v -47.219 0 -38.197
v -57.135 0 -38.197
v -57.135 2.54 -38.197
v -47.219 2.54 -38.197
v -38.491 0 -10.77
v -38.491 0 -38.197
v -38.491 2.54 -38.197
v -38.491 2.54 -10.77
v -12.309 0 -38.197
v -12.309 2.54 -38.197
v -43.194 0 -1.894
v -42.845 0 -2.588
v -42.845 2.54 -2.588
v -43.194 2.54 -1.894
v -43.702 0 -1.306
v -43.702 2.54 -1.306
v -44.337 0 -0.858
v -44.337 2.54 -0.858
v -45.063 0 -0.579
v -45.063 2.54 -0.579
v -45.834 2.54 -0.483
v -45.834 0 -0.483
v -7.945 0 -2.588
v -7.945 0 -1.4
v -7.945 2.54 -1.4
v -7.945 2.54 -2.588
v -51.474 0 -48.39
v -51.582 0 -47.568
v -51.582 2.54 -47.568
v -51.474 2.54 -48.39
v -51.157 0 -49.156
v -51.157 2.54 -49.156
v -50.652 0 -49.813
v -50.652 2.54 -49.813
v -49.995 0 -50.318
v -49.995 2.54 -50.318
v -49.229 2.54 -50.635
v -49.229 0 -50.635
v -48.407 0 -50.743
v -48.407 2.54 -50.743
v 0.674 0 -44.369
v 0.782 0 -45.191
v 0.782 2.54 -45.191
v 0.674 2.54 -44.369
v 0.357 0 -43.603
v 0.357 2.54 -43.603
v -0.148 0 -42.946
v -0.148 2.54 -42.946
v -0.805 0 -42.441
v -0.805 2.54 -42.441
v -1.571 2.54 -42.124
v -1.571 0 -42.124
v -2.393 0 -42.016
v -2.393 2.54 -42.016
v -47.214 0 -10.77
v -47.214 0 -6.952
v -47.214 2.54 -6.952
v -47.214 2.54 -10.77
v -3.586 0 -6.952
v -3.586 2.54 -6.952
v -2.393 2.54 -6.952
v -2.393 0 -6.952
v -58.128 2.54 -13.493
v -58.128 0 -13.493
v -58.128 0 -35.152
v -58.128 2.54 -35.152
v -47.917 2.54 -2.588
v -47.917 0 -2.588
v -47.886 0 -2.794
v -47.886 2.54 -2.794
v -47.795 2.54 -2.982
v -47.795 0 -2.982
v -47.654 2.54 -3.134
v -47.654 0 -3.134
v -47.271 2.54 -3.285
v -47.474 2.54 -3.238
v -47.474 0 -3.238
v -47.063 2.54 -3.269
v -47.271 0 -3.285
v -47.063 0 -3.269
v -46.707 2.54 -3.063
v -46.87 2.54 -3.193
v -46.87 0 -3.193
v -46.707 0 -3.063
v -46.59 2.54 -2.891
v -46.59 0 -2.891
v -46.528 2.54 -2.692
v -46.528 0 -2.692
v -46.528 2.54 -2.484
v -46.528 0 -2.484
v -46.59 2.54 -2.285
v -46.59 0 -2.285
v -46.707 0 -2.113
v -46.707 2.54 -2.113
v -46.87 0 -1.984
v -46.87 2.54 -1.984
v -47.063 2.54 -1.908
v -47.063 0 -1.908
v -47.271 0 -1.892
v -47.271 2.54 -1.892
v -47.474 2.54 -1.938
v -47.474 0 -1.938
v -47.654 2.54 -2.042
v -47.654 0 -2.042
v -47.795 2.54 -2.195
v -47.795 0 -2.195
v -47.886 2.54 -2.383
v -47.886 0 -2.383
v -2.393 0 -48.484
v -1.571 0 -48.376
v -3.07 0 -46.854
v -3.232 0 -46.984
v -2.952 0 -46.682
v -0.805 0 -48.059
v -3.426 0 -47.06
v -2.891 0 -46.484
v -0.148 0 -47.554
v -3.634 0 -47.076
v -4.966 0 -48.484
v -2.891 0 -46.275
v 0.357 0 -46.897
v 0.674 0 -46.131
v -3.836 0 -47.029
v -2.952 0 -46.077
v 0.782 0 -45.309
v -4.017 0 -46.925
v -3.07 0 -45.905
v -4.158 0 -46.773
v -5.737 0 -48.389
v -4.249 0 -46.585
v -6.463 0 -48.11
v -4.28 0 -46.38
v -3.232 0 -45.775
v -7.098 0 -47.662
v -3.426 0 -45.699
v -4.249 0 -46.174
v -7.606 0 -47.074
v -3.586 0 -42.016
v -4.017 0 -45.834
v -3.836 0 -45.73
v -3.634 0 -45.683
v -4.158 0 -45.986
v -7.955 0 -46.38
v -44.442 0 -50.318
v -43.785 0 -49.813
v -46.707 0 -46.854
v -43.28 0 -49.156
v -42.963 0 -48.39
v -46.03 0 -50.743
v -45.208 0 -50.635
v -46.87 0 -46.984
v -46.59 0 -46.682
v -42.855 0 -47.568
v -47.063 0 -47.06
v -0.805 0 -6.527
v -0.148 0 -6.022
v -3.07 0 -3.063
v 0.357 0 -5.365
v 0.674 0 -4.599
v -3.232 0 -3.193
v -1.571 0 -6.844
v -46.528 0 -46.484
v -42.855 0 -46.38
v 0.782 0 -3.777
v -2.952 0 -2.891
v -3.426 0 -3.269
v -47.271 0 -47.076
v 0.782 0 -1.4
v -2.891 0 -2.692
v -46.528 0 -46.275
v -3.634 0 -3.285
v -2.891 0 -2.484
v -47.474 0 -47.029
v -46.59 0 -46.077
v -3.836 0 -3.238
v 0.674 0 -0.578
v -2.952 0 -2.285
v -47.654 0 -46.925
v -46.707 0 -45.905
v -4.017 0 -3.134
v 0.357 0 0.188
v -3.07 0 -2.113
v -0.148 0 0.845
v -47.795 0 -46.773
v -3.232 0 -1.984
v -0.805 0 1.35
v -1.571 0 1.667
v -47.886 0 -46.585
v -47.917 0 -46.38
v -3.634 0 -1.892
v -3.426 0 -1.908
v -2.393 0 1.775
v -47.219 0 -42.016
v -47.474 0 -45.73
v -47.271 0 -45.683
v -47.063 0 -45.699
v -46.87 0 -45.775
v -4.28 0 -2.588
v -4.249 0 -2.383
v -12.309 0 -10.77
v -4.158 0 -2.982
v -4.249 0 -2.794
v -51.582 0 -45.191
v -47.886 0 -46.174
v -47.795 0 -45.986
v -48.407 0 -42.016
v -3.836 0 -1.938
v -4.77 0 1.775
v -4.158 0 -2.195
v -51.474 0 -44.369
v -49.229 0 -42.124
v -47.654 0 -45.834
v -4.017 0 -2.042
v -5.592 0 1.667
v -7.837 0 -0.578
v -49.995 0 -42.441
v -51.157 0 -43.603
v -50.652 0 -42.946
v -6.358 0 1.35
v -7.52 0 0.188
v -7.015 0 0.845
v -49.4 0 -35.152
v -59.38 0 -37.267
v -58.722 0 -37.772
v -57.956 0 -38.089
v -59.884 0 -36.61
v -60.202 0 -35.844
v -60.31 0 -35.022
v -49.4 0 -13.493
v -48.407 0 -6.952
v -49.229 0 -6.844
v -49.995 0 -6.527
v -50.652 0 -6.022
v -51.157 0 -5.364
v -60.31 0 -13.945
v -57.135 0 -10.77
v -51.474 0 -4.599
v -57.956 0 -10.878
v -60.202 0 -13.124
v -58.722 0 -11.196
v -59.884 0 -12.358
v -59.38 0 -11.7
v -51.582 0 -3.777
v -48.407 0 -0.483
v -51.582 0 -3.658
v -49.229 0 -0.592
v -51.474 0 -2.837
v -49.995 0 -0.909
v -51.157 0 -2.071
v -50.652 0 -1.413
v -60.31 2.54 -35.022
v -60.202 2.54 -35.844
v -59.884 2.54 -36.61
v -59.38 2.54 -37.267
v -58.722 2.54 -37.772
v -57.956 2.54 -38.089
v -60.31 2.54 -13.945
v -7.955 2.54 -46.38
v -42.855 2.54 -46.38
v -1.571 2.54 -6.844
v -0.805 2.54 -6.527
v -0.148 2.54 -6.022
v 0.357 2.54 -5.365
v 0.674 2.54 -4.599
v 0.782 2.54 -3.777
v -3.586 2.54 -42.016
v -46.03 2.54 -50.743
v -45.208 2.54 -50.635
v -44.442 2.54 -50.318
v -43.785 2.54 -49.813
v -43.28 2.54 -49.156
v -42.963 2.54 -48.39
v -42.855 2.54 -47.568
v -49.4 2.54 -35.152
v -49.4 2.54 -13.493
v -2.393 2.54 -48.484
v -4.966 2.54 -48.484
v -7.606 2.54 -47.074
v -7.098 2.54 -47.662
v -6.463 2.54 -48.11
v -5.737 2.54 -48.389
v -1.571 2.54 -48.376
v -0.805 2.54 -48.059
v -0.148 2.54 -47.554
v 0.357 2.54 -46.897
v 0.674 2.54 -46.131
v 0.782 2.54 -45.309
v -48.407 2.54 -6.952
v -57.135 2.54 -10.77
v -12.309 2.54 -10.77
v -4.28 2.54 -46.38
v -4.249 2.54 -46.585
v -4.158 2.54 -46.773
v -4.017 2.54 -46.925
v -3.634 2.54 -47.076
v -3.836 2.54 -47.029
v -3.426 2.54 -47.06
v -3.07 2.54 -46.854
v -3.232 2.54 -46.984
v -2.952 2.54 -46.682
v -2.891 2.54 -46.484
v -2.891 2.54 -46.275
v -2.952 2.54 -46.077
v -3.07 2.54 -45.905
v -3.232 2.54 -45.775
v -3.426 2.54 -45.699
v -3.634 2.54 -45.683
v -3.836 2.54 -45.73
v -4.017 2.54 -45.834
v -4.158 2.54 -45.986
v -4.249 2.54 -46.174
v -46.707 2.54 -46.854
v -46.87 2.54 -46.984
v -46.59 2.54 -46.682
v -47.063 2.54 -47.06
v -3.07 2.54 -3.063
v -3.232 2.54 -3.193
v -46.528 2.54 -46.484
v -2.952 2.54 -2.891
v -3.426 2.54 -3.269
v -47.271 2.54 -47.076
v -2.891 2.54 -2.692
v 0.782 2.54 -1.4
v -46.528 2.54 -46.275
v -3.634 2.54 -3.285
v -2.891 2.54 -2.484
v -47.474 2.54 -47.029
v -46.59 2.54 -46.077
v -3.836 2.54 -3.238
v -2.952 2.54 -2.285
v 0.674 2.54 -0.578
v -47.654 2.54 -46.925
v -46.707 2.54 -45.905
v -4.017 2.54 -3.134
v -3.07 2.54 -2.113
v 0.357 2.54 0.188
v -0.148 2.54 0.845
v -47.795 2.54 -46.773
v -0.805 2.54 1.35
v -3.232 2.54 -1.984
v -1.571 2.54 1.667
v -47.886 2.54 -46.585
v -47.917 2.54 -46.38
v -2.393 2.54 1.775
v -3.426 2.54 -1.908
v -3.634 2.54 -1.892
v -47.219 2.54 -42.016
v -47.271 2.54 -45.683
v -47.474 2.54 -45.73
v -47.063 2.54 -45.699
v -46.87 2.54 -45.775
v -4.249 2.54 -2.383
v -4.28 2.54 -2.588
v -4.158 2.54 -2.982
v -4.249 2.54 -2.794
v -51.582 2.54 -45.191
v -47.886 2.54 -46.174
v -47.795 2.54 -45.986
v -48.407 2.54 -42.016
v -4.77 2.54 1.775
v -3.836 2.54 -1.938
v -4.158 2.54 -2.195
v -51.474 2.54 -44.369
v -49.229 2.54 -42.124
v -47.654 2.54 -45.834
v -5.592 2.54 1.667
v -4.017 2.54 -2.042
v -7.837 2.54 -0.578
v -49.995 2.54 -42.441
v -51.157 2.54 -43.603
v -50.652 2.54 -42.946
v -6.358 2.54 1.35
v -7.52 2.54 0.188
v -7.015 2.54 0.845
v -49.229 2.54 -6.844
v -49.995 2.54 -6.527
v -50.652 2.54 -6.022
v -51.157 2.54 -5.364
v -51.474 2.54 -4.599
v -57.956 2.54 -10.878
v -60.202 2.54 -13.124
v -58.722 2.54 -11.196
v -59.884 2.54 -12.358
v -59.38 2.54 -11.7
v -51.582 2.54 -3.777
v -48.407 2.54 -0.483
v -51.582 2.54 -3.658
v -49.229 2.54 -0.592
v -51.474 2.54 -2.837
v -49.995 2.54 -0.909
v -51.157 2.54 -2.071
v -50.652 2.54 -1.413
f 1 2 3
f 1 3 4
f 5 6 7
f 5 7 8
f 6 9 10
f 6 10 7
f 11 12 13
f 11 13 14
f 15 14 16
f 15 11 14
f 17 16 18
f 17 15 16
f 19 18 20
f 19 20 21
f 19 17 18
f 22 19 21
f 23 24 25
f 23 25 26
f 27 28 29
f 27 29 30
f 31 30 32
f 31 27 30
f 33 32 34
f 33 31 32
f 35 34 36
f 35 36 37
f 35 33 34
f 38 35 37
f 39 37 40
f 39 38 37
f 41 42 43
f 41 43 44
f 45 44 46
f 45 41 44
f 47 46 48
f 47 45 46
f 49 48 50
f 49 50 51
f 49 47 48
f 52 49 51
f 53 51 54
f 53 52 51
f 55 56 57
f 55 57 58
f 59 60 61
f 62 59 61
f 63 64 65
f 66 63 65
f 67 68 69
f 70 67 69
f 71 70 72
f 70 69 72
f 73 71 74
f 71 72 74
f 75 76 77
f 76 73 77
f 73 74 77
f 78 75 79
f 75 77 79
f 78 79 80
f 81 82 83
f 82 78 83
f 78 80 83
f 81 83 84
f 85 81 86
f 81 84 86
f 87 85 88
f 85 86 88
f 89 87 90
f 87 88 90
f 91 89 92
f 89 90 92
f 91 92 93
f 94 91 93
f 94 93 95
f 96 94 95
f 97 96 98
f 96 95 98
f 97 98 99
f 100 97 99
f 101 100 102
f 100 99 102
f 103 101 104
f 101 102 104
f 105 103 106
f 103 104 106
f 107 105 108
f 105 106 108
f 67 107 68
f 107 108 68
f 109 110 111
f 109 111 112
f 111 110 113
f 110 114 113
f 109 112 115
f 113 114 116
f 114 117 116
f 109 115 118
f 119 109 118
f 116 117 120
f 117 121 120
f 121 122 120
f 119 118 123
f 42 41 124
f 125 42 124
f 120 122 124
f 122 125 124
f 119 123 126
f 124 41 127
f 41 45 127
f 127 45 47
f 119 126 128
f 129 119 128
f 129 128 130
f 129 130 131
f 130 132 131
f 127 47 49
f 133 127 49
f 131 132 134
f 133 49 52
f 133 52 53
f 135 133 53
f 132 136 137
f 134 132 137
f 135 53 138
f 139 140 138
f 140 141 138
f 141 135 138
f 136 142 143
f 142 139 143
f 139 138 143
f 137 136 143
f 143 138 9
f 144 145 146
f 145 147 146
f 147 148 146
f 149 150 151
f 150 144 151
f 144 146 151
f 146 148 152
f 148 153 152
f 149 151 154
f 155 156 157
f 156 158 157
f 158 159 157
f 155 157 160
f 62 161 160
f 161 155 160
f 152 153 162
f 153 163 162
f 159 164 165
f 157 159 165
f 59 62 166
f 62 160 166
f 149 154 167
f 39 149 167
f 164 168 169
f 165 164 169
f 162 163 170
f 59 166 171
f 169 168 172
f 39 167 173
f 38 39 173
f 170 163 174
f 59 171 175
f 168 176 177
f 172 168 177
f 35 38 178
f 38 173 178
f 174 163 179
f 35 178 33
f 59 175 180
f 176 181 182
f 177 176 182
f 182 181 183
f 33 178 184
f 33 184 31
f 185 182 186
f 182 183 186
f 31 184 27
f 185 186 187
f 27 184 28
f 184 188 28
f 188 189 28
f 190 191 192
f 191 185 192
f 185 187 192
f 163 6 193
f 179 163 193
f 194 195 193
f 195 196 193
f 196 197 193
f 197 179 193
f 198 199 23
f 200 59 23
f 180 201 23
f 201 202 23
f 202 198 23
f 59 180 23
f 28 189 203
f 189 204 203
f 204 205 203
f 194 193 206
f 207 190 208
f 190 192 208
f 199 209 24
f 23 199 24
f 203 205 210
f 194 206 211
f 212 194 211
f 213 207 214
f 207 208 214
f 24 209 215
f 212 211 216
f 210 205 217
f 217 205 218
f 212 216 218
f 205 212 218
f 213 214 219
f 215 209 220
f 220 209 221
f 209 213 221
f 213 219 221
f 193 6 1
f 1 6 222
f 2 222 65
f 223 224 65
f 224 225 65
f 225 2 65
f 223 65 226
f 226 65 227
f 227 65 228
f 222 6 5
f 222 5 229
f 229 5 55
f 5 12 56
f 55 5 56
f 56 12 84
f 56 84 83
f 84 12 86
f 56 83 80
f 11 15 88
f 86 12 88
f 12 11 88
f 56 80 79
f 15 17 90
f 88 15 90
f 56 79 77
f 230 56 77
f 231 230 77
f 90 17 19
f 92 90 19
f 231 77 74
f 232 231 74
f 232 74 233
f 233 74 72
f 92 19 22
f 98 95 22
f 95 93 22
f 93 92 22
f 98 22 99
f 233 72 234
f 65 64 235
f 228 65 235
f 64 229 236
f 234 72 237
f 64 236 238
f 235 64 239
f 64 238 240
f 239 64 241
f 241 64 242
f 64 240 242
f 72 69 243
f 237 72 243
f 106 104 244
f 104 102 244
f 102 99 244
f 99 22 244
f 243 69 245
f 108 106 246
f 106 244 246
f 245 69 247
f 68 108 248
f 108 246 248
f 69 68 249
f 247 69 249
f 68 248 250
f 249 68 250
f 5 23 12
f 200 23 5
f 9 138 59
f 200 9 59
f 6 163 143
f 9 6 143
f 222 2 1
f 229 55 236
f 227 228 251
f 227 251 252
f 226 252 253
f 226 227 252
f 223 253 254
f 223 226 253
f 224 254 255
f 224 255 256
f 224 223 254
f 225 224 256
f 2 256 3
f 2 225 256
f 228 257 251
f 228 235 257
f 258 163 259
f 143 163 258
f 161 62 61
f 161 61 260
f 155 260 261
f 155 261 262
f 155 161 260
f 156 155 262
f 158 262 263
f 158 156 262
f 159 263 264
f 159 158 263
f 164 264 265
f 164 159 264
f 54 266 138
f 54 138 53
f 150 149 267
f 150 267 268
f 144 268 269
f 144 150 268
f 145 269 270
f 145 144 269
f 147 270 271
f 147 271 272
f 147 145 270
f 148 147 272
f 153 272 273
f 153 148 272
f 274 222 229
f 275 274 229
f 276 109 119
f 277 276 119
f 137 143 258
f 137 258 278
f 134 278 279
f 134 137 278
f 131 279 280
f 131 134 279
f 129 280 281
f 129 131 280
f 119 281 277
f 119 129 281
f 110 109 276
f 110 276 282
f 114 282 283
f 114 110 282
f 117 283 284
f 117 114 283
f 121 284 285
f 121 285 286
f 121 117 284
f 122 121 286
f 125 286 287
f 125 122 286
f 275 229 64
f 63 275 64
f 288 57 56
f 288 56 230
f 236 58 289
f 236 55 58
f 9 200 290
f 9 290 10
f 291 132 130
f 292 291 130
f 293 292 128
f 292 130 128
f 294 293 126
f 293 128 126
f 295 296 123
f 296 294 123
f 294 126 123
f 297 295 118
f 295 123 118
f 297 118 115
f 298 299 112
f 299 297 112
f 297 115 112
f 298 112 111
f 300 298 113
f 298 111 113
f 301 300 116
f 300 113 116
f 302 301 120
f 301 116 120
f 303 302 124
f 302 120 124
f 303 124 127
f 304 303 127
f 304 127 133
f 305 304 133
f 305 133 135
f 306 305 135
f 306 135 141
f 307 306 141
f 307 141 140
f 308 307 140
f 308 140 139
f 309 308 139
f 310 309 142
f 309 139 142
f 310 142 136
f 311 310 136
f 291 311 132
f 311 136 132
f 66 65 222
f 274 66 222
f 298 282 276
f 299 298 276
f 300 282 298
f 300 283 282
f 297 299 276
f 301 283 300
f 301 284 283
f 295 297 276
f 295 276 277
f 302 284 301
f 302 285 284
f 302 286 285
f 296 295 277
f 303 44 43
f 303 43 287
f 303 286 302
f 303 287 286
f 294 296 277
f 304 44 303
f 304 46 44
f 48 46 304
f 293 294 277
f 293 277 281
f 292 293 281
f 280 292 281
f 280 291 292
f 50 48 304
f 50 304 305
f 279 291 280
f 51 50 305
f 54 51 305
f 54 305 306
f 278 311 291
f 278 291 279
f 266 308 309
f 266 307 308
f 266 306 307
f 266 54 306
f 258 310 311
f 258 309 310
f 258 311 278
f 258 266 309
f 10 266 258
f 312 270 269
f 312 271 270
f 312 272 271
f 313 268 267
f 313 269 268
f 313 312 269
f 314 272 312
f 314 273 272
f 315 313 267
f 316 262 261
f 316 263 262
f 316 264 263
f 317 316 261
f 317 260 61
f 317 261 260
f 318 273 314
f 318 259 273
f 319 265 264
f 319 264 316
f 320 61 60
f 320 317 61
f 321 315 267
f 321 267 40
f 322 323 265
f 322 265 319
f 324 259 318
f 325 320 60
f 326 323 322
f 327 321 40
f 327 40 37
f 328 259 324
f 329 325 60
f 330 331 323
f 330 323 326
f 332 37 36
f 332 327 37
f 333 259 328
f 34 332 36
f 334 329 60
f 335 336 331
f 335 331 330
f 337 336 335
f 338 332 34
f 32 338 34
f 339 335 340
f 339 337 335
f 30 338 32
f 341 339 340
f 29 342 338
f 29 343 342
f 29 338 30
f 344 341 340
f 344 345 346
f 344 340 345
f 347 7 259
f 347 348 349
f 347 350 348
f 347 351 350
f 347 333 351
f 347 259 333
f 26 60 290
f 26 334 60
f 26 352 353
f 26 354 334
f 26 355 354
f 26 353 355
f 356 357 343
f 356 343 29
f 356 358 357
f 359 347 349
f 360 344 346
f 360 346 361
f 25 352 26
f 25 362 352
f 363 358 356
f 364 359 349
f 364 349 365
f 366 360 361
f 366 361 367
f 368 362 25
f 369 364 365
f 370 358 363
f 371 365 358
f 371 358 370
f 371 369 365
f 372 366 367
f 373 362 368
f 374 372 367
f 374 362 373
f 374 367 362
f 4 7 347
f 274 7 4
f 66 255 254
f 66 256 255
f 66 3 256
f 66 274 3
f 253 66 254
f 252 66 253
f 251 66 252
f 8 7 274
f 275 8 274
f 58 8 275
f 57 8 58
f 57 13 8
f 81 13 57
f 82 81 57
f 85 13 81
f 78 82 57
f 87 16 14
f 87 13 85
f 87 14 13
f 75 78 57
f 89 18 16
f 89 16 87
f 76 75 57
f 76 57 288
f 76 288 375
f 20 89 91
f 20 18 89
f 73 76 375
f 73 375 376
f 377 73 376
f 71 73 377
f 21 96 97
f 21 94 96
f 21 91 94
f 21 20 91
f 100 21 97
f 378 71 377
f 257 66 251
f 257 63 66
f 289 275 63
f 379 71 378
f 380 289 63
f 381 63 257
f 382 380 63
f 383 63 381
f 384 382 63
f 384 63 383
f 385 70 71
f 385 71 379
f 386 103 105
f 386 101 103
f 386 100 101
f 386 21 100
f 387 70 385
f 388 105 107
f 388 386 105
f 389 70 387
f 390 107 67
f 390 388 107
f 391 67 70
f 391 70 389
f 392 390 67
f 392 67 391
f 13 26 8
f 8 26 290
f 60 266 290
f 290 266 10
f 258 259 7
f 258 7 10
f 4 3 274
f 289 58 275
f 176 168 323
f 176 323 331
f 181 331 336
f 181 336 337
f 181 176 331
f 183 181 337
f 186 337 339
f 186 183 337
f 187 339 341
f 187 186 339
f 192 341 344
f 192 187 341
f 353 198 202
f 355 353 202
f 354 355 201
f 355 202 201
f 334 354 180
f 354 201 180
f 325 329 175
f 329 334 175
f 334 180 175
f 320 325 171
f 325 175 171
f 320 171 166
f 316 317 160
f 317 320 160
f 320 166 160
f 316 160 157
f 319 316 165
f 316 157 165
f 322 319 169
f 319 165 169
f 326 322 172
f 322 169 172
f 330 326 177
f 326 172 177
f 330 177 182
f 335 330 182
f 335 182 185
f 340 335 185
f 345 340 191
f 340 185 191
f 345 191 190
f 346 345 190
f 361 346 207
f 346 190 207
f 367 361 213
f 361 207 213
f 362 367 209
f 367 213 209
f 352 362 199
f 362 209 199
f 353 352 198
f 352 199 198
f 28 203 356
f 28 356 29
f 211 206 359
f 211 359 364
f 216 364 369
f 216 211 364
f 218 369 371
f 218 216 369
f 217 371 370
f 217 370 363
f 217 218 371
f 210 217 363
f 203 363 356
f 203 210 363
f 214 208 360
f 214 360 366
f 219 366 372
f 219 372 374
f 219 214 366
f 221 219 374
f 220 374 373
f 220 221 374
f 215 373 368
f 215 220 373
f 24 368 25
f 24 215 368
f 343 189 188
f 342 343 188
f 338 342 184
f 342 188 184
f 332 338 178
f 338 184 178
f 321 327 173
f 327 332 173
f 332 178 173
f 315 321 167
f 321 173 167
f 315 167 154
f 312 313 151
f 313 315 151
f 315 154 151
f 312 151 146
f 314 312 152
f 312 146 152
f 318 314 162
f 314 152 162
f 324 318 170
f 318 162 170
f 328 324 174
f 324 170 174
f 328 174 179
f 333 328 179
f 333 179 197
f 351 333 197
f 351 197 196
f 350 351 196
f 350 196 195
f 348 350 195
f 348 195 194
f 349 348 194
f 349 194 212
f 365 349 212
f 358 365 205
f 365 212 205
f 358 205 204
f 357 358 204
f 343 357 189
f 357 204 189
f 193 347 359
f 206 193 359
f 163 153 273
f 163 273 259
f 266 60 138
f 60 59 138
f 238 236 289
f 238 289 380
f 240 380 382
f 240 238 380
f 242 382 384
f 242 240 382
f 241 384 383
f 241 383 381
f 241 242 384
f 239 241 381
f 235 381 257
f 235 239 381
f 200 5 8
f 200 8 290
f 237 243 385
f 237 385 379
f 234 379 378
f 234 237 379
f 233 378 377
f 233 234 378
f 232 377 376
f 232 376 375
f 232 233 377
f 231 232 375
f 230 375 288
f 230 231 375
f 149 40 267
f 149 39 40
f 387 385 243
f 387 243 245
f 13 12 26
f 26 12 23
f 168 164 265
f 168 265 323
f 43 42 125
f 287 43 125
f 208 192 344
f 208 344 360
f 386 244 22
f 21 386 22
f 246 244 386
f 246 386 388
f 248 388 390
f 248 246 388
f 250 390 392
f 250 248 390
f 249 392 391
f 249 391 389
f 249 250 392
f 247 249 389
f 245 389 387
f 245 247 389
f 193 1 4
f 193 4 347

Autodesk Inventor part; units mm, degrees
ref_plane "YZ Plane" through (0, 0, 0) normal (1, 0, 0) x (0, 1, 0)
ref_plane "XZ Plane" through (0, 0, 0) normal (0, 1, 0) x (-1, 0, 0)
ref_plane "XY Plane" through (0, 0, 0) normal (0, 0, 1) x (1, 0, 0)
sketch "Sketch1" plane through (0, 0, 0) normal (0, 1, 0) x (-1, 0, 0)
  line L0 (42.8447, -6.952) -> (51.5823, -6.952)
  line L1 (51.5823, -6.952) -> (51.5823, -0.4834)
  line L2 (51.5823, -0.4834) -> (42.8447, -0.4834)
  line L3 (42.8447, -0.4834) -> (42.8447, -6.952)
  line L4 (-0.7823, -48.4843) -> (7.9553, -48.4843)
  line L5 (7.9553, -48.4843) -> (7.9553, -42.0157)
  line L6 (7.9553, -42.0157) -> (-0.7823, -42.0157)
  line L7 (-0.7823, -42.0157) -> (-0.7823, -48.4843)
  line L8 (7.9451, -6.952) -> (-0.7823, -6.952)
  line L9 (-0.7823, -6.952) -> (-0.7823, 1.7754)
  line L10 (-0.7823, 1.7754) -> (7.9451, 1.7754)
  line L11 (7.9451, 1.7754) -> (7.9451, -6.952)
  line L12 (42.8549, -50.7432) -> (42.8549, -42.0157)
  line L13 (51.5823, -50.7432) -> (42.8549, -50.7432)
  line L14 (51.5823, -42.0157) -> (51.5823, -50.7432)
  line L15 (42.8549, -42.0157) -> (51.5823, -42.0157)
  line L16 (42.8447, -2.5883) -> (7.935, -2.5883)
  line L17 (42.8549, -42.0157) -> (42.8549, -46.3795)
  line L18 (42.8549, -46.3795) -> (7.9451, -46.3795)
  line L19 (42.8549, -42.0157) -> (47.2186, -42.0157)
  line L20 (7.9451, -6.952) -> (3.5865, -6.952)
  line L21 (3.5865, -6.952) -> (3.5865, -42.0157)
  line L22 (12.309, -38.1974) -> (38.491, -38.1974)
  line L23 (38.491, -38.1974) -> (38.491, -10.7703)
  line L24 (38.491, -10.7703) -> (12.309, -10.7703)
  line L25 (12.309, -10.7703) -> (12.309, -38.1974)
  line L26 (47.2135, -10.7703) -> (60.3097, -10.7703)
  line L27 (60.3097, -10.7703) -> (60.3097, -38.1974)
  line L28 (60.3097, -38.1974) -> (47.2186, -38.1974)
  line L29 (47.2135, -6.952) -> (47.2135, -10.7703)
  line L30 (47.2186, -38.1974) -> (47.2186, -42.0157)
  line L31 (47.2135, -6.952) -> (51.5823, -6.952)
  line L32 (49.4004, -13.4933) -> (58.1279, -13.4933)
  line L33 (58.1279, -13.4933) -> (58.1279, -35.1517)
  line L34 (58.1279, -35.1517) -> (49.4004, -35.1517)
  line L35 (49.4004, -35.1517) -> (49.4004, -13.4933)
  circle A0 centre (47.2186, -2.5883) radius 0.6982
  circle A1 centre (3.5814, -2.5883) radius 0.6982
  circle A2 centre (3.5814, -46.3795) radius 0.6982
  circle A3 centre (47.2186, -46.3795) radius 0.6982
  point P0 (0, 0)
  point P1 (25.4, -24.4839)
  point P2 (3.5865, -6.952)
  point P3 (7.9553, -46.3795)
  point P4 (7.9451, -2.5883)
  point P5 (47.2186, -42.0157)
  dimension "d2" = 8.7376
  dimension "d6" = 360
  dimension "d10" = 360
  dimension "d19" = 5.7909
  dimension "d20" = 5.7909
  dimension "d21" = 13.0912
  dimension "d29" = 1.3964
  dimension "d32" = 360
  dimension "d38" = 43.6372
extrude "Extrusion3" add sketch "Sketch1" along normal blind 2.54
fillet "Fillet4" radius 3.175 14 edges at (-51.5823, 1.27, -0.4834) (-42.8447, 1.27, -0.4834) (-51.5823, 1.27, -6.952) (-7.9451, 1.27, 1.7754) (0.7823, 1.27, 1.7754) (0.7823, 1.27, -6.952) (0.7823, 1.27, -42.0157) (0.7823, 1.27, -48.4843) (-7.9553, 1.27, -48.4843) (-42.8549, 1.27, -50.7432) (-51.5823, 1.27, -50.7432) (-51.5823, 1.27, -42.0157) (-60.3097, 1.27, -38.1974) (-60.3097, 1.27, -10.7703)
equation "\"BendRadius\" = Thickness"
equation "\"BendReliefWidth\" = Thickness"
equation "\"BendReliefDepth\" = 0.5 * Thickness"
equation "\"CornerReliefSize\" = 4 * Thickness"
equation "\"MinimumRemnant\" = 2 * Thickness"
equation "\"TransitionRadius\" = BendRadius"
equation "\"JacobiRadiusSize\" = BendRadius"
equation "\"GapSize\" = Thickness"
equation "\"Thickness\" = 3.048"
properties part number "PixfalconHolder"
